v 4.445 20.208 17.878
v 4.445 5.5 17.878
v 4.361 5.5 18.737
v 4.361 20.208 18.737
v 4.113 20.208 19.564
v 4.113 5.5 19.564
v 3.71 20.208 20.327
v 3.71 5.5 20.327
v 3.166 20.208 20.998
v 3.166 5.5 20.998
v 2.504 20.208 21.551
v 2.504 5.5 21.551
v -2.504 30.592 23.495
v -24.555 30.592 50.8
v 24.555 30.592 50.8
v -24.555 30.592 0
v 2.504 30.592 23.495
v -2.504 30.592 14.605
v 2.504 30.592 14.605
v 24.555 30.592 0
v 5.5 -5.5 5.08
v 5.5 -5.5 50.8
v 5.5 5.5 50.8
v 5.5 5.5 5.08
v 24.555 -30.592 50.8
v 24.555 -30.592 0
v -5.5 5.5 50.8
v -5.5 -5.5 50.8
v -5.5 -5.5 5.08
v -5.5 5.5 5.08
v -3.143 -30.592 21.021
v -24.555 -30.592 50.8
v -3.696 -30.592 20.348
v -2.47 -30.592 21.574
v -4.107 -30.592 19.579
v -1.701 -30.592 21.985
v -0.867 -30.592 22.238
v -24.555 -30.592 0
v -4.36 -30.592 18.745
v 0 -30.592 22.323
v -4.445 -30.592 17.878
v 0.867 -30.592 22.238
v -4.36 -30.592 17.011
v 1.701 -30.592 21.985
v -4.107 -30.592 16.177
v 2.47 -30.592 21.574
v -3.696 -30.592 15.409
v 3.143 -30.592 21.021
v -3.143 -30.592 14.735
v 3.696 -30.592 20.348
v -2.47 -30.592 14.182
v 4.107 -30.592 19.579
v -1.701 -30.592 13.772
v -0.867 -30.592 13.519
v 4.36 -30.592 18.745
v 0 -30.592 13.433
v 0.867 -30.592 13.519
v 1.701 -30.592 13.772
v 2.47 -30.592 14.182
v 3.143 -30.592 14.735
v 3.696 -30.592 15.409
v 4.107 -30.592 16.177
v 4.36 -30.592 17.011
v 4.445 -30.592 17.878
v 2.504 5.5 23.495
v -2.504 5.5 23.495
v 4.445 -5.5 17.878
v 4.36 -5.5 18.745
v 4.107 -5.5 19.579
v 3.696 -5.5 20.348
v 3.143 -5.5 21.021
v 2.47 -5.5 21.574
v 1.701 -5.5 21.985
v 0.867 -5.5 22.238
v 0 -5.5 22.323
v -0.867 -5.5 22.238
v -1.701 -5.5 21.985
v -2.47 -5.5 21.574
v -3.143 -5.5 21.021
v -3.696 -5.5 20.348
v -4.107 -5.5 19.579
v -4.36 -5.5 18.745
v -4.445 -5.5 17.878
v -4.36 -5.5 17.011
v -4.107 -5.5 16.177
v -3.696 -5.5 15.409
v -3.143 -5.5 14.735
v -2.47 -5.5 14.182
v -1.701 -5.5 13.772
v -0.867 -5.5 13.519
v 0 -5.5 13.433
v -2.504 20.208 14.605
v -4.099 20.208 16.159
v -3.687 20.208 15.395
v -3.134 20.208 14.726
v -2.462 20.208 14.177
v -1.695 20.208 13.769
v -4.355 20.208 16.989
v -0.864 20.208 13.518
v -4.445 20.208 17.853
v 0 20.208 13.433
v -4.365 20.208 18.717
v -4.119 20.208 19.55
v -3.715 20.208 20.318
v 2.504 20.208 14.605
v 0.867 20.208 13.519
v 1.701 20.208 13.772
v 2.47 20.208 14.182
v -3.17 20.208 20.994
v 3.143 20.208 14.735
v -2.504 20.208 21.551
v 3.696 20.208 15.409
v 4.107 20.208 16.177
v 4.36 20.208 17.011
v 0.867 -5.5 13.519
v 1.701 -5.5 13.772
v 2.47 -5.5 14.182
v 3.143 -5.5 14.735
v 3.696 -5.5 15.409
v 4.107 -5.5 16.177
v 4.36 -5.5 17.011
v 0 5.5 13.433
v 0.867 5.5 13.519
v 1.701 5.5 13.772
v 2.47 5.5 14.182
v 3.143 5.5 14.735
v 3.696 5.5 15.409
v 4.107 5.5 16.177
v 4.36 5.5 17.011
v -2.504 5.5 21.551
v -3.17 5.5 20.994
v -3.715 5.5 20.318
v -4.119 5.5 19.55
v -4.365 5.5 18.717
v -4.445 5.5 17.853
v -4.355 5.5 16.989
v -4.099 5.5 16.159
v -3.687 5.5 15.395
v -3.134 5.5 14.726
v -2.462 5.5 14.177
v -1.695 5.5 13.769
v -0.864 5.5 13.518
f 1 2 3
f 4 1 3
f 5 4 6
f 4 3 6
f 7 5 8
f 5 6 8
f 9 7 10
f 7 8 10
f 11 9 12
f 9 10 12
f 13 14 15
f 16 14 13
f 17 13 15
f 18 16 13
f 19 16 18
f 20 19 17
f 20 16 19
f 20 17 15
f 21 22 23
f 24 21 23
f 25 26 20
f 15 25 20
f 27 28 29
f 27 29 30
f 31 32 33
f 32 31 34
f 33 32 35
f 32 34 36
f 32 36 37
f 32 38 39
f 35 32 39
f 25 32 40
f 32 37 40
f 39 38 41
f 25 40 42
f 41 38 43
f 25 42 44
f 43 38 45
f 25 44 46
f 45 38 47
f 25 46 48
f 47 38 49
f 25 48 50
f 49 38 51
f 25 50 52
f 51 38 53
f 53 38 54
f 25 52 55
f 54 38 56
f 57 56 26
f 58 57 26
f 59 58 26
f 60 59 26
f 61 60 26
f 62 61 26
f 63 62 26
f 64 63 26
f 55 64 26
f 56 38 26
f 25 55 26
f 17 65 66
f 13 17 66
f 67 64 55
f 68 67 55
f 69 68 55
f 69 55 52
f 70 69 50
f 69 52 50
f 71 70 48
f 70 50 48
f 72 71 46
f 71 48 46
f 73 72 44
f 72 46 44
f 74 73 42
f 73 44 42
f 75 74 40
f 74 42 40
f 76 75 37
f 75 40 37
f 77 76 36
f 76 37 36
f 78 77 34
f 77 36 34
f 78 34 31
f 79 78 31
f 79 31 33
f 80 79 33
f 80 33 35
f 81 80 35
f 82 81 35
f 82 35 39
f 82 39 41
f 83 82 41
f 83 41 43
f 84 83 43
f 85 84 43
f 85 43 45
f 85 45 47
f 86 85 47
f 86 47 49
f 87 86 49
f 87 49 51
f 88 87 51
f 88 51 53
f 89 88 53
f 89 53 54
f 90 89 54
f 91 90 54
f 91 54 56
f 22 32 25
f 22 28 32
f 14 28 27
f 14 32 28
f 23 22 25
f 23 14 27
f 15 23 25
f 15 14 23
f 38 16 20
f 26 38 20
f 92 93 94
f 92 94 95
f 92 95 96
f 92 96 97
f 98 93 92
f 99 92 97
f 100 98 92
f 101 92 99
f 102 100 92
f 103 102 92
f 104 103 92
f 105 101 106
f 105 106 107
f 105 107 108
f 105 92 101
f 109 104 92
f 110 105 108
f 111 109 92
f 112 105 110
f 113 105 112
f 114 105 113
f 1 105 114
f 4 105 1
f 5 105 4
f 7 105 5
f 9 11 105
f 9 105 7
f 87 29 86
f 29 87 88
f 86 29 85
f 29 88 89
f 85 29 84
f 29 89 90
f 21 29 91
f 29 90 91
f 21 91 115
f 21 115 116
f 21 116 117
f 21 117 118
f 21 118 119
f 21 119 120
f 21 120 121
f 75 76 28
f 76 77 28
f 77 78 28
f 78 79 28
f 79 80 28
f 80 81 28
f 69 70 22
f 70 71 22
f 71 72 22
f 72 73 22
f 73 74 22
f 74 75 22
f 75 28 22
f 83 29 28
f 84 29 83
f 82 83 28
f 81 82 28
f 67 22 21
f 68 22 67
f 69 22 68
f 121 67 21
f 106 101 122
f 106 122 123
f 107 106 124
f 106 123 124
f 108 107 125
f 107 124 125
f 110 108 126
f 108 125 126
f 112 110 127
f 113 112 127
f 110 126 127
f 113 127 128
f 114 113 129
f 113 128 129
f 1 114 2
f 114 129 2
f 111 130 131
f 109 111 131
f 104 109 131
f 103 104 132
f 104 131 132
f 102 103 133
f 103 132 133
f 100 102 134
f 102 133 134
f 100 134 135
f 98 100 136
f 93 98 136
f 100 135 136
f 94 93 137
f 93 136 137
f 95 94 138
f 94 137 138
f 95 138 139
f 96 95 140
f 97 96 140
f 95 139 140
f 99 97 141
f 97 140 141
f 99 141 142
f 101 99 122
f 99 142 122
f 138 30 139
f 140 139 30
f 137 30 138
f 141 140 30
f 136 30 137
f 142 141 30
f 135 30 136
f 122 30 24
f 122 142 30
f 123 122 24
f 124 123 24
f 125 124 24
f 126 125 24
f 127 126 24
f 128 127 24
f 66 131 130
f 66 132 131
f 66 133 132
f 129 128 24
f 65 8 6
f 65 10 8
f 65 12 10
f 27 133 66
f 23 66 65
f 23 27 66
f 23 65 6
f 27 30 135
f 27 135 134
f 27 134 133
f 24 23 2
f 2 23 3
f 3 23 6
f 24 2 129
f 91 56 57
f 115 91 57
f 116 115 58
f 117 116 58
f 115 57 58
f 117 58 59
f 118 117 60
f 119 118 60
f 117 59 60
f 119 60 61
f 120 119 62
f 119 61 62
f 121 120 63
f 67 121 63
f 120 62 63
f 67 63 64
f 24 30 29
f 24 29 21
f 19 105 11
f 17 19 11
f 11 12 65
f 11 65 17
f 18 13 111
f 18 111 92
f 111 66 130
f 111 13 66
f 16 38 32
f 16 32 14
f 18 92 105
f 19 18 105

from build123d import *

# Parameters (mm, degrees)
F0_W     = 49.110298
F0_H     = 61.184842
F1_DEPTH = 50.8
F2_W     = 11
F2_H     = 11
F3_DEPTH = 45.72
F6_DEPTH = 50.8
F7_DEPTH = 50.8


with BuildPart() as f1:
    # F0 (on Top) → F1 (new body)
    with BuildSketch(Plane.XY):
        Rectangle(F0_W, F0_H)
    extrude(amount=F1_DEPTH)

    # F2 (on face) → F3 (cut)
    with BuildSketch(Plane.XY.offset(50.8)):
        Rectangle(F2_W, F2_H)
    extrude(amount=-F3_DEPTH, mode=Mode.SUBTRACT)

    # F4 (on Front) → F6 (cut)
    with BuildSketch(Plane.XZ):
        Polygon((-2.50393, 23.495), (-2.50393, 14.605), (0, 14.605), (2.50393, 14.605), (2.50393, 23.495), align=None)
    extrude(amount=-F6_DEPTH, mode=Mode.SUBTRACT)

    # F5 (on face) → F7 (cut)
    with BuildSketch(Plane.XZ.offset(30.592421)):
        with BuildLine():
            ThreePointArc((4.445, 17.878173), (-3.14309, 21.021263), (0, 13.433173))
            ThreePointArc((0, 13.433173), (3.14309, 14.735084), (4.445, 17.878173))
        make_face()
    extrude(amount=-F7_DEPTH, mode=Mode.SUBTRACT)


solid = f1.part
